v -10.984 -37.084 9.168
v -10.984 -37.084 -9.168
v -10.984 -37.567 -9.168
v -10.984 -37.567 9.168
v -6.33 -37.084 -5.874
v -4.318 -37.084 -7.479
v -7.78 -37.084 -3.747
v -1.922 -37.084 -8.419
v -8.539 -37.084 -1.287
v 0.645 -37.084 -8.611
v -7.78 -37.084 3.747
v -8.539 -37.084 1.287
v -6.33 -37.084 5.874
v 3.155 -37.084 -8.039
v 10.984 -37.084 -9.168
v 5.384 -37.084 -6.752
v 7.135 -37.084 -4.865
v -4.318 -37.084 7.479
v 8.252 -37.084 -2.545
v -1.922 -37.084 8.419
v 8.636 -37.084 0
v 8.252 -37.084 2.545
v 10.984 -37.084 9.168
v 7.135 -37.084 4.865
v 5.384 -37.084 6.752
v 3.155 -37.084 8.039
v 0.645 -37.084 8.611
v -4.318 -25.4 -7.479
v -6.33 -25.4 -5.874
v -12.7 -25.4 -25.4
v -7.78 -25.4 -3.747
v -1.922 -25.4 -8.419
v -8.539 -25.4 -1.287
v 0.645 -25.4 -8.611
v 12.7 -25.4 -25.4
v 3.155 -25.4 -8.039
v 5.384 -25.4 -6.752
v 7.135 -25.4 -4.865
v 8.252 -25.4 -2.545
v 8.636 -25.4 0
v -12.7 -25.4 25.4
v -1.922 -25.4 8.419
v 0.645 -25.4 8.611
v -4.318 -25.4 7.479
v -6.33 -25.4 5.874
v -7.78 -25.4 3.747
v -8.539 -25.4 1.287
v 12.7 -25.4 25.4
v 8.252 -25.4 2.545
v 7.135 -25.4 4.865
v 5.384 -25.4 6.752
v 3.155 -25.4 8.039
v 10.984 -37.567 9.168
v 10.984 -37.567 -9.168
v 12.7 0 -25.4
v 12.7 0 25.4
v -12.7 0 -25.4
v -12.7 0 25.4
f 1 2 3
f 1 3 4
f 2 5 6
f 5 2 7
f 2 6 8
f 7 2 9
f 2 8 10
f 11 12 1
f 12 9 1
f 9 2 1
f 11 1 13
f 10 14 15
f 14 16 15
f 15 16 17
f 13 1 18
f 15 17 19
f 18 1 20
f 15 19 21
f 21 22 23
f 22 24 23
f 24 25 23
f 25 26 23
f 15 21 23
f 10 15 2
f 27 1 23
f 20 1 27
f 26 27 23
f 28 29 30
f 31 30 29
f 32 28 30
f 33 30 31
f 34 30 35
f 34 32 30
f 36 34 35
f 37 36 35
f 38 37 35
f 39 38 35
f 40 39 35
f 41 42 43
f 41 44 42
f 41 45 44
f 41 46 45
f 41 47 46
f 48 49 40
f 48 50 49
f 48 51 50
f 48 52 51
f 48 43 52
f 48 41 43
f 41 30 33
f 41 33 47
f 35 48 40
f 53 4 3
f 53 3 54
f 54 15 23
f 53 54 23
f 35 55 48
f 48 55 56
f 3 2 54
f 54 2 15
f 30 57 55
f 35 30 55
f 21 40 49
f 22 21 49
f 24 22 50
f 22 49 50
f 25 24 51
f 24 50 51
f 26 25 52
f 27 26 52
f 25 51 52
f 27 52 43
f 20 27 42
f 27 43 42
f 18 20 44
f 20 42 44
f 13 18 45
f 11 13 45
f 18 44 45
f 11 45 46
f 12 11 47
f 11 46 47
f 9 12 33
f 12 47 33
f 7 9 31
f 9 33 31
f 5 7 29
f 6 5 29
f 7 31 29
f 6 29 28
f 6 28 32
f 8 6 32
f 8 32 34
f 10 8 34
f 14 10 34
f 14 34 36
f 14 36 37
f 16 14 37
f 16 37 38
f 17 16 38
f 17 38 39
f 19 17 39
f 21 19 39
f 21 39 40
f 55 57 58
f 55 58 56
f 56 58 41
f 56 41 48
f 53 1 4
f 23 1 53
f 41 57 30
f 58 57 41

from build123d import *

# Parameters (mm, degrees)
F0_W      = 25.4
F0_H      = 50.8
F1_DEPTH  = 25.4
F2_R      = 8.635626
F3_DEPTH  = 24.638
F3_FACE_R = 8.635626
F4_DEPTH  = 36.322
F5_W      = 21.968006
F5_H      = 18.33639
F6_DEPTH  = 0.4826


with BuildPart() as f1:
    # F0 (on Front) → F1 (new body)
    with BuildSketch(Plane.XZ):
        Rectangle(F0_W, F0_H)
    extrude(amount=F1_DEPTH)

    # F2 (on face) → F3 (cut)
    with BuildSketch(Plane.XZ.offset(25.4)):
        Circle(F2_R)
    extrude(amount=-F3_DEPTH, mode=Mode.SUBTRACT)

    # F3_face (on face) → F4 (join)
    with BuildSketch(Plane.XZ.offset(0.762)):
        Circle(F3_FACE_R)
    extrude(amount=F4_DEPTH)

    # F5 (on face) → F6 (join)
    with BuildSketch(Plane.XZ.offset(37.084)):
        Rectangle(F5_W, F5_H)
    extrude(amount=F6_DEPTH)


solid = f1.part
